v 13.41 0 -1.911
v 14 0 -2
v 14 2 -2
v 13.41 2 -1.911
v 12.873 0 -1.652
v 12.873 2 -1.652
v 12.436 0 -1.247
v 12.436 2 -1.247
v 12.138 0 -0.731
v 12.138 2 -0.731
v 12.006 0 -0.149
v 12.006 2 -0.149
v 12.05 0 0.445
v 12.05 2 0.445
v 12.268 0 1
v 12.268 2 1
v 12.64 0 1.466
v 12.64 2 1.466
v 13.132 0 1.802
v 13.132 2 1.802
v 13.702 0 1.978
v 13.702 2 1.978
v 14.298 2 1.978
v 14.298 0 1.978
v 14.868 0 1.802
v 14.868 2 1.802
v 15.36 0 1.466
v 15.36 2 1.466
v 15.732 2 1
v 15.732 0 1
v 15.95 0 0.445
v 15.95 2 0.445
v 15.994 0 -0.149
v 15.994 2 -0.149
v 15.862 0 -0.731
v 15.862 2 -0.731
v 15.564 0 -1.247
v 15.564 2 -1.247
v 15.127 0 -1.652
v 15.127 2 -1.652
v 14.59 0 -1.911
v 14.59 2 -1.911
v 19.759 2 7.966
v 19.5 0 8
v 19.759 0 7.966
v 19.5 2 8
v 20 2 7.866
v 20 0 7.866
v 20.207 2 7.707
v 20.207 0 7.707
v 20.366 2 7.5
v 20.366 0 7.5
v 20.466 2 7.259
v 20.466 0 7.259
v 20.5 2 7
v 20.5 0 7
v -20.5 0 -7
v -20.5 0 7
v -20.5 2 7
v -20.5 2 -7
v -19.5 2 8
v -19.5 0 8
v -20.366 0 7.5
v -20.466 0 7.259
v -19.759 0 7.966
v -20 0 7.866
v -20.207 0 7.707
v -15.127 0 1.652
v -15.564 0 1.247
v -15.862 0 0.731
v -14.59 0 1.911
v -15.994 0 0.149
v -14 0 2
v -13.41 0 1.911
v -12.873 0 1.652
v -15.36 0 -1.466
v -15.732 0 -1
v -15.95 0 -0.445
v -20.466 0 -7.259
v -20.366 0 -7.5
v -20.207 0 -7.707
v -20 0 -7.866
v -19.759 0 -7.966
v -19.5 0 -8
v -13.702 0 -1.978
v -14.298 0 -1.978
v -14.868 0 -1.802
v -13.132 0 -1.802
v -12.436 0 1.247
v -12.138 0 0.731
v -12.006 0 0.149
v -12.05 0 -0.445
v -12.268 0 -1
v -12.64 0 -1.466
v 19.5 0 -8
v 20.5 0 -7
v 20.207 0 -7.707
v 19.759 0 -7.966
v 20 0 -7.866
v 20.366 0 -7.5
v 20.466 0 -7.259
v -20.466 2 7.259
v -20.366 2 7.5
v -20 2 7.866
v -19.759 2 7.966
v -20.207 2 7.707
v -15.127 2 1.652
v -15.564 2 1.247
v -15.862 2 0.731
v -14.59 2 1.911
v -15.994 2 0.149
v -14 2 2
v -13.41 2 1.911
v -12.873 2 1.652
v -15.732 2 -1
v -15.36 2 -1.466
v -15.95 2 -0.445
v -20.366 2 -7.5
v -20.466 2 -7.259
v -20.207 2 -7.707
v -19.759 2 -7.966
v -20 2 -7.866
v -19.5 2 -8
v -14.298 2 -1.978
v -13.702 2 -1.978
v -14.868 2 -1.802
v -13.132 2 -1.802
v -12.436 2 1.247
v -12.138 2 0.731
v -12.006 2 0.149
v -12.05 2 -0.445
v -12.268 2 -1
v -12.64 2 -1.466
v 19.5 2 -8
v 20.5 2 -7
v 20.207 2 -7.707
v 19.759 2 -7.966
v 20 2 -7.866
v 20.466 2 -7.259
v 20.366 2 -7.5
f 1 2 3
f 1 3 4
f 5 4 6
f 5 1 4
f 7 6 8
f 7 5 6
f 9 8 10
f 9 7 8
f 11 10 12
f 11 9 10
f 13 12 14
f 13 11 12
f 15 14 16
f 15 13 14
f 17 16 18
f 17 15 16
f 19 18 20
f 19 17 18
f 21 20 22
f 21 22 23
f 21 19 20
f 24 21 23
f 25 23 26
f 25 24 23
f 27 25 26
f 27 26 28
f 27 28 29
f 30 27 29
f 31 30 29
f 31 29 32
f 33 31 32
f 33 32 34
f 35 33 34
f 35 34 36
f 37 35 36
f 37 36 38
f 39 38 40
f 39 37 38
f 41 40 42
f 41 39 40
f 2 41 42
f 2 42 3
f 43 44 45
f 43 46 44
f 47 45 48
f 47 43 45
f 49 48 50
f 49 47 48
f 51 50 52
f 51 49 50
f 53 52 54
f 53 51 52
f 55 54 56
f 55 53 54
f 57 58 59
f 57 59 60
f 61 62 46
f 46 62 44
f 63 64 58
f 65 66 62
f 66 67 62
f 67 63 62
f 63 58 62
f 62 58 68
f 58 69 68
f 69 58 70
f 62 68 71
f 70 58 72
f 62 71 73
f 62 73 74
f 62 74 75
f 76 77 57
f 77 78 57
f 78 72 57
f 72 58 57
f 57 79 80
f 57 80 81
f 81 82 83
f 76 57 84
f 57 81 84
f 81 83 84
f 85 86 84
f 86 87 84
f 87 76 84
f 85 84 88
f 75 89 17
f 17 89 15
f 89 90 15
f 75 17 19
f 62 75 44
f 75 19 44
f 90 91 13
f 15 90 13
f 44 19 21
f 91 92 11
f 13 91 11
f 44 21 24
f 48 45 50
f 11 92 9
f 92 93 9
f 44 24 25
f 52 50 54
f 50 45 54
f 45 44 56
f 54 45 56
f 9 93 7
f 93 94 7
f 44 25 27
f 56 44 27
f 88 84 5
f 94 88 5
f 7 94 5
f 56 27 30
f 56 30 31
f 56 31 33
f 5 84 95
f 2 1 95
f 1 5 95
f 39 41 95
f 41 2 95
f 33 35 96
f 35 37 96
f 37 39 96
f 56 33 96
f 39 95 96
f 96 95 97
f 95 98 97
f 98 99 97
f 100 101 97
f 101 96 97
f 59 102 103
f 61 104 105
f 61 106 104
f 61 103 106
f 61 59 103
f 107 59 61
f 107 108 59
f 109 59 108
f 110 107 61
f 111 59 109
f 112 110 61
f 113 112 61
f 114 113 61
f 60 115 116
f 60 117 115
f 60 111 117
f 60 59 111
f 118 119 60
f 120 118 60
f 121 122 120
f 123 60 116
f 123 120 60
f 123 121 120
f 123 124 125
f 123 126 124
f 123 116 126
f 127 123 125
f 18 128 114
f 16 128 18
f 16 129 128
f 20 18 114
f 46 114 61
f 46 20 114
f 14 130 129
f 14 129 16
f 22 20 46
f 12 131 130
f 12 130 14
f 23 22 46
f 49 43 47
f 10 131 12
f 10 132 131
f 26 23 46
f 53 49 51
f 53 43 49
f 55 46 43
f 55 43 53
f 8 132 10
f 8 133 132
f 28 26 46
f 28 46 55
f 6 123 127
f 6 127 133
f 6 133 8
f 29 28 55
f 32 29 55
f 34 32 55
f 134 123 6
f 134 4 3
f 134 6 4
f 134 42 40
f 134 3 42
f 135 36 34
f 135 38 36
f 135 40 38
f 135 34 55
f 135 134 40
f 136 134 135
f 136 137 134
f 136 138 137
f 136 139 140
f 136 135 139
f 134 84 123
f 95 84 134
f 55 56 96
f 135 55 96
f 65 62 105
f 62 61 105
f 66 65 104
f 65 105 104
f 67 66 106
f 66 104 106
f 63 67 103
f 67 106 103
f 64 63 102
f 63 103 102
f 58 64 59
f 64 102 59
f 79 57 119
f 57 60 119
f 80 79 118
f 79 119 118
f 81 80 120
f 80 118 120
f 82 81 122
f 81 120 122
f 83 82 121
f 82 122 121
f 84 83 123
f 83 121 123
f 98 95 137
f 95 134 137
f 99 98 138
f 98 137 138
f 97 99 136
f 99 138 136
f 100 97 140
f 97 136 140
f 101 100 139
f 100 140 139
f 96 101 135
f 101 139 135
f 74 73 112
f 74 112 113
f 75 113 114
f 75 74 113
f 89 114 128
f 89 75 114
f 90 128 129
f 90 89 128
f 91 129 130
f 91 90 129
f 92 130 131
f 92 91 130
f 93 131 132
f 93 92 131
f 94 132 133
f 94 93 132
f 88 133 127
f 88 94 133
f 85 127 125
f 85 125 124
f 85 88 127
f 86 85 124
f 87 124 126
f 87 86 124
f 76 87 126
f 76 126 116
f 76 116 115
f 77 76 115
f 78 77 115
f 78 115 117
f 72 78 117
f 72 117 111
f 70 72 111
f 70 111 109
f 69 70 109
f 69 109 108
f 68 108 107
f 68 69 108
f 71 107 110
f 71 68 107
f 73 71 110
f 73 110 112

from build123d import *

# Parameters (mm, degrees)
SKETCH_1_W      = 41
SKETCH_1_H      = 16
SKETCH_1_R      = 2
EXTRUDE_1_DEPTH = 2
FILLET_1_R      = 1
FILLET_2_R      = 1
FILLET_3_R      = 1
FILLET_4_R      = 1


with BuildPart() as part:
    # 草图1 → 凸台-拉伸1 (new body)
    with BuildSketch(Plane(origin=(0, 0, 0), x_dir=(1, 0, 0), z_dir=(0, 1, 0))):
        Rectangle(SKETCH_1_W, SKETCH_1_H)
        with Locations(Location((-14, 0, 0), (0, 0, 270))):
            Circle(SKETCH_1_R, mode=Mode.SUBTRACT)
        with Locations(Location((14, 0, 0), (0, 0, 90))):
            Circle(SKETCH_1_R, mode=Mode.SUBTRACT)
    extrude(amount=EXTRUDE_1_DEPTH)

    # 圆角1
    fillet_1_edges = [part.edges().sort_by_distance(p)[0] for p in [
        (20.5, 1, 8),
    ]]
    fillet(fillet_1_edges, radius=FILLET_1_R)

    # 圆角2
    fillet_2_edges = [part.edges().sort_by_distance(p)[0] for p in [
        (-20.5, 1, 8),
    ]]
    fillet(fillet_2_edges, radius=FILLET_2_R)

    # 圆角3
    fillet_3_edges = [part.edges().sort_by_distance(p)[0] for p in [
        (-20.5, 1, -8),
    ]]
    fillet(fillet_3_edges, radius=FILLET_3_R)

    # 圆角4
    fillet_4_edges = [part.edges().sort_by_distance(p)[0] for p in [
        (20.5, 1, -8),
    ]]
    fillet(fillet_4_edges, radius=FILLET_4_R)


solid = part.part
